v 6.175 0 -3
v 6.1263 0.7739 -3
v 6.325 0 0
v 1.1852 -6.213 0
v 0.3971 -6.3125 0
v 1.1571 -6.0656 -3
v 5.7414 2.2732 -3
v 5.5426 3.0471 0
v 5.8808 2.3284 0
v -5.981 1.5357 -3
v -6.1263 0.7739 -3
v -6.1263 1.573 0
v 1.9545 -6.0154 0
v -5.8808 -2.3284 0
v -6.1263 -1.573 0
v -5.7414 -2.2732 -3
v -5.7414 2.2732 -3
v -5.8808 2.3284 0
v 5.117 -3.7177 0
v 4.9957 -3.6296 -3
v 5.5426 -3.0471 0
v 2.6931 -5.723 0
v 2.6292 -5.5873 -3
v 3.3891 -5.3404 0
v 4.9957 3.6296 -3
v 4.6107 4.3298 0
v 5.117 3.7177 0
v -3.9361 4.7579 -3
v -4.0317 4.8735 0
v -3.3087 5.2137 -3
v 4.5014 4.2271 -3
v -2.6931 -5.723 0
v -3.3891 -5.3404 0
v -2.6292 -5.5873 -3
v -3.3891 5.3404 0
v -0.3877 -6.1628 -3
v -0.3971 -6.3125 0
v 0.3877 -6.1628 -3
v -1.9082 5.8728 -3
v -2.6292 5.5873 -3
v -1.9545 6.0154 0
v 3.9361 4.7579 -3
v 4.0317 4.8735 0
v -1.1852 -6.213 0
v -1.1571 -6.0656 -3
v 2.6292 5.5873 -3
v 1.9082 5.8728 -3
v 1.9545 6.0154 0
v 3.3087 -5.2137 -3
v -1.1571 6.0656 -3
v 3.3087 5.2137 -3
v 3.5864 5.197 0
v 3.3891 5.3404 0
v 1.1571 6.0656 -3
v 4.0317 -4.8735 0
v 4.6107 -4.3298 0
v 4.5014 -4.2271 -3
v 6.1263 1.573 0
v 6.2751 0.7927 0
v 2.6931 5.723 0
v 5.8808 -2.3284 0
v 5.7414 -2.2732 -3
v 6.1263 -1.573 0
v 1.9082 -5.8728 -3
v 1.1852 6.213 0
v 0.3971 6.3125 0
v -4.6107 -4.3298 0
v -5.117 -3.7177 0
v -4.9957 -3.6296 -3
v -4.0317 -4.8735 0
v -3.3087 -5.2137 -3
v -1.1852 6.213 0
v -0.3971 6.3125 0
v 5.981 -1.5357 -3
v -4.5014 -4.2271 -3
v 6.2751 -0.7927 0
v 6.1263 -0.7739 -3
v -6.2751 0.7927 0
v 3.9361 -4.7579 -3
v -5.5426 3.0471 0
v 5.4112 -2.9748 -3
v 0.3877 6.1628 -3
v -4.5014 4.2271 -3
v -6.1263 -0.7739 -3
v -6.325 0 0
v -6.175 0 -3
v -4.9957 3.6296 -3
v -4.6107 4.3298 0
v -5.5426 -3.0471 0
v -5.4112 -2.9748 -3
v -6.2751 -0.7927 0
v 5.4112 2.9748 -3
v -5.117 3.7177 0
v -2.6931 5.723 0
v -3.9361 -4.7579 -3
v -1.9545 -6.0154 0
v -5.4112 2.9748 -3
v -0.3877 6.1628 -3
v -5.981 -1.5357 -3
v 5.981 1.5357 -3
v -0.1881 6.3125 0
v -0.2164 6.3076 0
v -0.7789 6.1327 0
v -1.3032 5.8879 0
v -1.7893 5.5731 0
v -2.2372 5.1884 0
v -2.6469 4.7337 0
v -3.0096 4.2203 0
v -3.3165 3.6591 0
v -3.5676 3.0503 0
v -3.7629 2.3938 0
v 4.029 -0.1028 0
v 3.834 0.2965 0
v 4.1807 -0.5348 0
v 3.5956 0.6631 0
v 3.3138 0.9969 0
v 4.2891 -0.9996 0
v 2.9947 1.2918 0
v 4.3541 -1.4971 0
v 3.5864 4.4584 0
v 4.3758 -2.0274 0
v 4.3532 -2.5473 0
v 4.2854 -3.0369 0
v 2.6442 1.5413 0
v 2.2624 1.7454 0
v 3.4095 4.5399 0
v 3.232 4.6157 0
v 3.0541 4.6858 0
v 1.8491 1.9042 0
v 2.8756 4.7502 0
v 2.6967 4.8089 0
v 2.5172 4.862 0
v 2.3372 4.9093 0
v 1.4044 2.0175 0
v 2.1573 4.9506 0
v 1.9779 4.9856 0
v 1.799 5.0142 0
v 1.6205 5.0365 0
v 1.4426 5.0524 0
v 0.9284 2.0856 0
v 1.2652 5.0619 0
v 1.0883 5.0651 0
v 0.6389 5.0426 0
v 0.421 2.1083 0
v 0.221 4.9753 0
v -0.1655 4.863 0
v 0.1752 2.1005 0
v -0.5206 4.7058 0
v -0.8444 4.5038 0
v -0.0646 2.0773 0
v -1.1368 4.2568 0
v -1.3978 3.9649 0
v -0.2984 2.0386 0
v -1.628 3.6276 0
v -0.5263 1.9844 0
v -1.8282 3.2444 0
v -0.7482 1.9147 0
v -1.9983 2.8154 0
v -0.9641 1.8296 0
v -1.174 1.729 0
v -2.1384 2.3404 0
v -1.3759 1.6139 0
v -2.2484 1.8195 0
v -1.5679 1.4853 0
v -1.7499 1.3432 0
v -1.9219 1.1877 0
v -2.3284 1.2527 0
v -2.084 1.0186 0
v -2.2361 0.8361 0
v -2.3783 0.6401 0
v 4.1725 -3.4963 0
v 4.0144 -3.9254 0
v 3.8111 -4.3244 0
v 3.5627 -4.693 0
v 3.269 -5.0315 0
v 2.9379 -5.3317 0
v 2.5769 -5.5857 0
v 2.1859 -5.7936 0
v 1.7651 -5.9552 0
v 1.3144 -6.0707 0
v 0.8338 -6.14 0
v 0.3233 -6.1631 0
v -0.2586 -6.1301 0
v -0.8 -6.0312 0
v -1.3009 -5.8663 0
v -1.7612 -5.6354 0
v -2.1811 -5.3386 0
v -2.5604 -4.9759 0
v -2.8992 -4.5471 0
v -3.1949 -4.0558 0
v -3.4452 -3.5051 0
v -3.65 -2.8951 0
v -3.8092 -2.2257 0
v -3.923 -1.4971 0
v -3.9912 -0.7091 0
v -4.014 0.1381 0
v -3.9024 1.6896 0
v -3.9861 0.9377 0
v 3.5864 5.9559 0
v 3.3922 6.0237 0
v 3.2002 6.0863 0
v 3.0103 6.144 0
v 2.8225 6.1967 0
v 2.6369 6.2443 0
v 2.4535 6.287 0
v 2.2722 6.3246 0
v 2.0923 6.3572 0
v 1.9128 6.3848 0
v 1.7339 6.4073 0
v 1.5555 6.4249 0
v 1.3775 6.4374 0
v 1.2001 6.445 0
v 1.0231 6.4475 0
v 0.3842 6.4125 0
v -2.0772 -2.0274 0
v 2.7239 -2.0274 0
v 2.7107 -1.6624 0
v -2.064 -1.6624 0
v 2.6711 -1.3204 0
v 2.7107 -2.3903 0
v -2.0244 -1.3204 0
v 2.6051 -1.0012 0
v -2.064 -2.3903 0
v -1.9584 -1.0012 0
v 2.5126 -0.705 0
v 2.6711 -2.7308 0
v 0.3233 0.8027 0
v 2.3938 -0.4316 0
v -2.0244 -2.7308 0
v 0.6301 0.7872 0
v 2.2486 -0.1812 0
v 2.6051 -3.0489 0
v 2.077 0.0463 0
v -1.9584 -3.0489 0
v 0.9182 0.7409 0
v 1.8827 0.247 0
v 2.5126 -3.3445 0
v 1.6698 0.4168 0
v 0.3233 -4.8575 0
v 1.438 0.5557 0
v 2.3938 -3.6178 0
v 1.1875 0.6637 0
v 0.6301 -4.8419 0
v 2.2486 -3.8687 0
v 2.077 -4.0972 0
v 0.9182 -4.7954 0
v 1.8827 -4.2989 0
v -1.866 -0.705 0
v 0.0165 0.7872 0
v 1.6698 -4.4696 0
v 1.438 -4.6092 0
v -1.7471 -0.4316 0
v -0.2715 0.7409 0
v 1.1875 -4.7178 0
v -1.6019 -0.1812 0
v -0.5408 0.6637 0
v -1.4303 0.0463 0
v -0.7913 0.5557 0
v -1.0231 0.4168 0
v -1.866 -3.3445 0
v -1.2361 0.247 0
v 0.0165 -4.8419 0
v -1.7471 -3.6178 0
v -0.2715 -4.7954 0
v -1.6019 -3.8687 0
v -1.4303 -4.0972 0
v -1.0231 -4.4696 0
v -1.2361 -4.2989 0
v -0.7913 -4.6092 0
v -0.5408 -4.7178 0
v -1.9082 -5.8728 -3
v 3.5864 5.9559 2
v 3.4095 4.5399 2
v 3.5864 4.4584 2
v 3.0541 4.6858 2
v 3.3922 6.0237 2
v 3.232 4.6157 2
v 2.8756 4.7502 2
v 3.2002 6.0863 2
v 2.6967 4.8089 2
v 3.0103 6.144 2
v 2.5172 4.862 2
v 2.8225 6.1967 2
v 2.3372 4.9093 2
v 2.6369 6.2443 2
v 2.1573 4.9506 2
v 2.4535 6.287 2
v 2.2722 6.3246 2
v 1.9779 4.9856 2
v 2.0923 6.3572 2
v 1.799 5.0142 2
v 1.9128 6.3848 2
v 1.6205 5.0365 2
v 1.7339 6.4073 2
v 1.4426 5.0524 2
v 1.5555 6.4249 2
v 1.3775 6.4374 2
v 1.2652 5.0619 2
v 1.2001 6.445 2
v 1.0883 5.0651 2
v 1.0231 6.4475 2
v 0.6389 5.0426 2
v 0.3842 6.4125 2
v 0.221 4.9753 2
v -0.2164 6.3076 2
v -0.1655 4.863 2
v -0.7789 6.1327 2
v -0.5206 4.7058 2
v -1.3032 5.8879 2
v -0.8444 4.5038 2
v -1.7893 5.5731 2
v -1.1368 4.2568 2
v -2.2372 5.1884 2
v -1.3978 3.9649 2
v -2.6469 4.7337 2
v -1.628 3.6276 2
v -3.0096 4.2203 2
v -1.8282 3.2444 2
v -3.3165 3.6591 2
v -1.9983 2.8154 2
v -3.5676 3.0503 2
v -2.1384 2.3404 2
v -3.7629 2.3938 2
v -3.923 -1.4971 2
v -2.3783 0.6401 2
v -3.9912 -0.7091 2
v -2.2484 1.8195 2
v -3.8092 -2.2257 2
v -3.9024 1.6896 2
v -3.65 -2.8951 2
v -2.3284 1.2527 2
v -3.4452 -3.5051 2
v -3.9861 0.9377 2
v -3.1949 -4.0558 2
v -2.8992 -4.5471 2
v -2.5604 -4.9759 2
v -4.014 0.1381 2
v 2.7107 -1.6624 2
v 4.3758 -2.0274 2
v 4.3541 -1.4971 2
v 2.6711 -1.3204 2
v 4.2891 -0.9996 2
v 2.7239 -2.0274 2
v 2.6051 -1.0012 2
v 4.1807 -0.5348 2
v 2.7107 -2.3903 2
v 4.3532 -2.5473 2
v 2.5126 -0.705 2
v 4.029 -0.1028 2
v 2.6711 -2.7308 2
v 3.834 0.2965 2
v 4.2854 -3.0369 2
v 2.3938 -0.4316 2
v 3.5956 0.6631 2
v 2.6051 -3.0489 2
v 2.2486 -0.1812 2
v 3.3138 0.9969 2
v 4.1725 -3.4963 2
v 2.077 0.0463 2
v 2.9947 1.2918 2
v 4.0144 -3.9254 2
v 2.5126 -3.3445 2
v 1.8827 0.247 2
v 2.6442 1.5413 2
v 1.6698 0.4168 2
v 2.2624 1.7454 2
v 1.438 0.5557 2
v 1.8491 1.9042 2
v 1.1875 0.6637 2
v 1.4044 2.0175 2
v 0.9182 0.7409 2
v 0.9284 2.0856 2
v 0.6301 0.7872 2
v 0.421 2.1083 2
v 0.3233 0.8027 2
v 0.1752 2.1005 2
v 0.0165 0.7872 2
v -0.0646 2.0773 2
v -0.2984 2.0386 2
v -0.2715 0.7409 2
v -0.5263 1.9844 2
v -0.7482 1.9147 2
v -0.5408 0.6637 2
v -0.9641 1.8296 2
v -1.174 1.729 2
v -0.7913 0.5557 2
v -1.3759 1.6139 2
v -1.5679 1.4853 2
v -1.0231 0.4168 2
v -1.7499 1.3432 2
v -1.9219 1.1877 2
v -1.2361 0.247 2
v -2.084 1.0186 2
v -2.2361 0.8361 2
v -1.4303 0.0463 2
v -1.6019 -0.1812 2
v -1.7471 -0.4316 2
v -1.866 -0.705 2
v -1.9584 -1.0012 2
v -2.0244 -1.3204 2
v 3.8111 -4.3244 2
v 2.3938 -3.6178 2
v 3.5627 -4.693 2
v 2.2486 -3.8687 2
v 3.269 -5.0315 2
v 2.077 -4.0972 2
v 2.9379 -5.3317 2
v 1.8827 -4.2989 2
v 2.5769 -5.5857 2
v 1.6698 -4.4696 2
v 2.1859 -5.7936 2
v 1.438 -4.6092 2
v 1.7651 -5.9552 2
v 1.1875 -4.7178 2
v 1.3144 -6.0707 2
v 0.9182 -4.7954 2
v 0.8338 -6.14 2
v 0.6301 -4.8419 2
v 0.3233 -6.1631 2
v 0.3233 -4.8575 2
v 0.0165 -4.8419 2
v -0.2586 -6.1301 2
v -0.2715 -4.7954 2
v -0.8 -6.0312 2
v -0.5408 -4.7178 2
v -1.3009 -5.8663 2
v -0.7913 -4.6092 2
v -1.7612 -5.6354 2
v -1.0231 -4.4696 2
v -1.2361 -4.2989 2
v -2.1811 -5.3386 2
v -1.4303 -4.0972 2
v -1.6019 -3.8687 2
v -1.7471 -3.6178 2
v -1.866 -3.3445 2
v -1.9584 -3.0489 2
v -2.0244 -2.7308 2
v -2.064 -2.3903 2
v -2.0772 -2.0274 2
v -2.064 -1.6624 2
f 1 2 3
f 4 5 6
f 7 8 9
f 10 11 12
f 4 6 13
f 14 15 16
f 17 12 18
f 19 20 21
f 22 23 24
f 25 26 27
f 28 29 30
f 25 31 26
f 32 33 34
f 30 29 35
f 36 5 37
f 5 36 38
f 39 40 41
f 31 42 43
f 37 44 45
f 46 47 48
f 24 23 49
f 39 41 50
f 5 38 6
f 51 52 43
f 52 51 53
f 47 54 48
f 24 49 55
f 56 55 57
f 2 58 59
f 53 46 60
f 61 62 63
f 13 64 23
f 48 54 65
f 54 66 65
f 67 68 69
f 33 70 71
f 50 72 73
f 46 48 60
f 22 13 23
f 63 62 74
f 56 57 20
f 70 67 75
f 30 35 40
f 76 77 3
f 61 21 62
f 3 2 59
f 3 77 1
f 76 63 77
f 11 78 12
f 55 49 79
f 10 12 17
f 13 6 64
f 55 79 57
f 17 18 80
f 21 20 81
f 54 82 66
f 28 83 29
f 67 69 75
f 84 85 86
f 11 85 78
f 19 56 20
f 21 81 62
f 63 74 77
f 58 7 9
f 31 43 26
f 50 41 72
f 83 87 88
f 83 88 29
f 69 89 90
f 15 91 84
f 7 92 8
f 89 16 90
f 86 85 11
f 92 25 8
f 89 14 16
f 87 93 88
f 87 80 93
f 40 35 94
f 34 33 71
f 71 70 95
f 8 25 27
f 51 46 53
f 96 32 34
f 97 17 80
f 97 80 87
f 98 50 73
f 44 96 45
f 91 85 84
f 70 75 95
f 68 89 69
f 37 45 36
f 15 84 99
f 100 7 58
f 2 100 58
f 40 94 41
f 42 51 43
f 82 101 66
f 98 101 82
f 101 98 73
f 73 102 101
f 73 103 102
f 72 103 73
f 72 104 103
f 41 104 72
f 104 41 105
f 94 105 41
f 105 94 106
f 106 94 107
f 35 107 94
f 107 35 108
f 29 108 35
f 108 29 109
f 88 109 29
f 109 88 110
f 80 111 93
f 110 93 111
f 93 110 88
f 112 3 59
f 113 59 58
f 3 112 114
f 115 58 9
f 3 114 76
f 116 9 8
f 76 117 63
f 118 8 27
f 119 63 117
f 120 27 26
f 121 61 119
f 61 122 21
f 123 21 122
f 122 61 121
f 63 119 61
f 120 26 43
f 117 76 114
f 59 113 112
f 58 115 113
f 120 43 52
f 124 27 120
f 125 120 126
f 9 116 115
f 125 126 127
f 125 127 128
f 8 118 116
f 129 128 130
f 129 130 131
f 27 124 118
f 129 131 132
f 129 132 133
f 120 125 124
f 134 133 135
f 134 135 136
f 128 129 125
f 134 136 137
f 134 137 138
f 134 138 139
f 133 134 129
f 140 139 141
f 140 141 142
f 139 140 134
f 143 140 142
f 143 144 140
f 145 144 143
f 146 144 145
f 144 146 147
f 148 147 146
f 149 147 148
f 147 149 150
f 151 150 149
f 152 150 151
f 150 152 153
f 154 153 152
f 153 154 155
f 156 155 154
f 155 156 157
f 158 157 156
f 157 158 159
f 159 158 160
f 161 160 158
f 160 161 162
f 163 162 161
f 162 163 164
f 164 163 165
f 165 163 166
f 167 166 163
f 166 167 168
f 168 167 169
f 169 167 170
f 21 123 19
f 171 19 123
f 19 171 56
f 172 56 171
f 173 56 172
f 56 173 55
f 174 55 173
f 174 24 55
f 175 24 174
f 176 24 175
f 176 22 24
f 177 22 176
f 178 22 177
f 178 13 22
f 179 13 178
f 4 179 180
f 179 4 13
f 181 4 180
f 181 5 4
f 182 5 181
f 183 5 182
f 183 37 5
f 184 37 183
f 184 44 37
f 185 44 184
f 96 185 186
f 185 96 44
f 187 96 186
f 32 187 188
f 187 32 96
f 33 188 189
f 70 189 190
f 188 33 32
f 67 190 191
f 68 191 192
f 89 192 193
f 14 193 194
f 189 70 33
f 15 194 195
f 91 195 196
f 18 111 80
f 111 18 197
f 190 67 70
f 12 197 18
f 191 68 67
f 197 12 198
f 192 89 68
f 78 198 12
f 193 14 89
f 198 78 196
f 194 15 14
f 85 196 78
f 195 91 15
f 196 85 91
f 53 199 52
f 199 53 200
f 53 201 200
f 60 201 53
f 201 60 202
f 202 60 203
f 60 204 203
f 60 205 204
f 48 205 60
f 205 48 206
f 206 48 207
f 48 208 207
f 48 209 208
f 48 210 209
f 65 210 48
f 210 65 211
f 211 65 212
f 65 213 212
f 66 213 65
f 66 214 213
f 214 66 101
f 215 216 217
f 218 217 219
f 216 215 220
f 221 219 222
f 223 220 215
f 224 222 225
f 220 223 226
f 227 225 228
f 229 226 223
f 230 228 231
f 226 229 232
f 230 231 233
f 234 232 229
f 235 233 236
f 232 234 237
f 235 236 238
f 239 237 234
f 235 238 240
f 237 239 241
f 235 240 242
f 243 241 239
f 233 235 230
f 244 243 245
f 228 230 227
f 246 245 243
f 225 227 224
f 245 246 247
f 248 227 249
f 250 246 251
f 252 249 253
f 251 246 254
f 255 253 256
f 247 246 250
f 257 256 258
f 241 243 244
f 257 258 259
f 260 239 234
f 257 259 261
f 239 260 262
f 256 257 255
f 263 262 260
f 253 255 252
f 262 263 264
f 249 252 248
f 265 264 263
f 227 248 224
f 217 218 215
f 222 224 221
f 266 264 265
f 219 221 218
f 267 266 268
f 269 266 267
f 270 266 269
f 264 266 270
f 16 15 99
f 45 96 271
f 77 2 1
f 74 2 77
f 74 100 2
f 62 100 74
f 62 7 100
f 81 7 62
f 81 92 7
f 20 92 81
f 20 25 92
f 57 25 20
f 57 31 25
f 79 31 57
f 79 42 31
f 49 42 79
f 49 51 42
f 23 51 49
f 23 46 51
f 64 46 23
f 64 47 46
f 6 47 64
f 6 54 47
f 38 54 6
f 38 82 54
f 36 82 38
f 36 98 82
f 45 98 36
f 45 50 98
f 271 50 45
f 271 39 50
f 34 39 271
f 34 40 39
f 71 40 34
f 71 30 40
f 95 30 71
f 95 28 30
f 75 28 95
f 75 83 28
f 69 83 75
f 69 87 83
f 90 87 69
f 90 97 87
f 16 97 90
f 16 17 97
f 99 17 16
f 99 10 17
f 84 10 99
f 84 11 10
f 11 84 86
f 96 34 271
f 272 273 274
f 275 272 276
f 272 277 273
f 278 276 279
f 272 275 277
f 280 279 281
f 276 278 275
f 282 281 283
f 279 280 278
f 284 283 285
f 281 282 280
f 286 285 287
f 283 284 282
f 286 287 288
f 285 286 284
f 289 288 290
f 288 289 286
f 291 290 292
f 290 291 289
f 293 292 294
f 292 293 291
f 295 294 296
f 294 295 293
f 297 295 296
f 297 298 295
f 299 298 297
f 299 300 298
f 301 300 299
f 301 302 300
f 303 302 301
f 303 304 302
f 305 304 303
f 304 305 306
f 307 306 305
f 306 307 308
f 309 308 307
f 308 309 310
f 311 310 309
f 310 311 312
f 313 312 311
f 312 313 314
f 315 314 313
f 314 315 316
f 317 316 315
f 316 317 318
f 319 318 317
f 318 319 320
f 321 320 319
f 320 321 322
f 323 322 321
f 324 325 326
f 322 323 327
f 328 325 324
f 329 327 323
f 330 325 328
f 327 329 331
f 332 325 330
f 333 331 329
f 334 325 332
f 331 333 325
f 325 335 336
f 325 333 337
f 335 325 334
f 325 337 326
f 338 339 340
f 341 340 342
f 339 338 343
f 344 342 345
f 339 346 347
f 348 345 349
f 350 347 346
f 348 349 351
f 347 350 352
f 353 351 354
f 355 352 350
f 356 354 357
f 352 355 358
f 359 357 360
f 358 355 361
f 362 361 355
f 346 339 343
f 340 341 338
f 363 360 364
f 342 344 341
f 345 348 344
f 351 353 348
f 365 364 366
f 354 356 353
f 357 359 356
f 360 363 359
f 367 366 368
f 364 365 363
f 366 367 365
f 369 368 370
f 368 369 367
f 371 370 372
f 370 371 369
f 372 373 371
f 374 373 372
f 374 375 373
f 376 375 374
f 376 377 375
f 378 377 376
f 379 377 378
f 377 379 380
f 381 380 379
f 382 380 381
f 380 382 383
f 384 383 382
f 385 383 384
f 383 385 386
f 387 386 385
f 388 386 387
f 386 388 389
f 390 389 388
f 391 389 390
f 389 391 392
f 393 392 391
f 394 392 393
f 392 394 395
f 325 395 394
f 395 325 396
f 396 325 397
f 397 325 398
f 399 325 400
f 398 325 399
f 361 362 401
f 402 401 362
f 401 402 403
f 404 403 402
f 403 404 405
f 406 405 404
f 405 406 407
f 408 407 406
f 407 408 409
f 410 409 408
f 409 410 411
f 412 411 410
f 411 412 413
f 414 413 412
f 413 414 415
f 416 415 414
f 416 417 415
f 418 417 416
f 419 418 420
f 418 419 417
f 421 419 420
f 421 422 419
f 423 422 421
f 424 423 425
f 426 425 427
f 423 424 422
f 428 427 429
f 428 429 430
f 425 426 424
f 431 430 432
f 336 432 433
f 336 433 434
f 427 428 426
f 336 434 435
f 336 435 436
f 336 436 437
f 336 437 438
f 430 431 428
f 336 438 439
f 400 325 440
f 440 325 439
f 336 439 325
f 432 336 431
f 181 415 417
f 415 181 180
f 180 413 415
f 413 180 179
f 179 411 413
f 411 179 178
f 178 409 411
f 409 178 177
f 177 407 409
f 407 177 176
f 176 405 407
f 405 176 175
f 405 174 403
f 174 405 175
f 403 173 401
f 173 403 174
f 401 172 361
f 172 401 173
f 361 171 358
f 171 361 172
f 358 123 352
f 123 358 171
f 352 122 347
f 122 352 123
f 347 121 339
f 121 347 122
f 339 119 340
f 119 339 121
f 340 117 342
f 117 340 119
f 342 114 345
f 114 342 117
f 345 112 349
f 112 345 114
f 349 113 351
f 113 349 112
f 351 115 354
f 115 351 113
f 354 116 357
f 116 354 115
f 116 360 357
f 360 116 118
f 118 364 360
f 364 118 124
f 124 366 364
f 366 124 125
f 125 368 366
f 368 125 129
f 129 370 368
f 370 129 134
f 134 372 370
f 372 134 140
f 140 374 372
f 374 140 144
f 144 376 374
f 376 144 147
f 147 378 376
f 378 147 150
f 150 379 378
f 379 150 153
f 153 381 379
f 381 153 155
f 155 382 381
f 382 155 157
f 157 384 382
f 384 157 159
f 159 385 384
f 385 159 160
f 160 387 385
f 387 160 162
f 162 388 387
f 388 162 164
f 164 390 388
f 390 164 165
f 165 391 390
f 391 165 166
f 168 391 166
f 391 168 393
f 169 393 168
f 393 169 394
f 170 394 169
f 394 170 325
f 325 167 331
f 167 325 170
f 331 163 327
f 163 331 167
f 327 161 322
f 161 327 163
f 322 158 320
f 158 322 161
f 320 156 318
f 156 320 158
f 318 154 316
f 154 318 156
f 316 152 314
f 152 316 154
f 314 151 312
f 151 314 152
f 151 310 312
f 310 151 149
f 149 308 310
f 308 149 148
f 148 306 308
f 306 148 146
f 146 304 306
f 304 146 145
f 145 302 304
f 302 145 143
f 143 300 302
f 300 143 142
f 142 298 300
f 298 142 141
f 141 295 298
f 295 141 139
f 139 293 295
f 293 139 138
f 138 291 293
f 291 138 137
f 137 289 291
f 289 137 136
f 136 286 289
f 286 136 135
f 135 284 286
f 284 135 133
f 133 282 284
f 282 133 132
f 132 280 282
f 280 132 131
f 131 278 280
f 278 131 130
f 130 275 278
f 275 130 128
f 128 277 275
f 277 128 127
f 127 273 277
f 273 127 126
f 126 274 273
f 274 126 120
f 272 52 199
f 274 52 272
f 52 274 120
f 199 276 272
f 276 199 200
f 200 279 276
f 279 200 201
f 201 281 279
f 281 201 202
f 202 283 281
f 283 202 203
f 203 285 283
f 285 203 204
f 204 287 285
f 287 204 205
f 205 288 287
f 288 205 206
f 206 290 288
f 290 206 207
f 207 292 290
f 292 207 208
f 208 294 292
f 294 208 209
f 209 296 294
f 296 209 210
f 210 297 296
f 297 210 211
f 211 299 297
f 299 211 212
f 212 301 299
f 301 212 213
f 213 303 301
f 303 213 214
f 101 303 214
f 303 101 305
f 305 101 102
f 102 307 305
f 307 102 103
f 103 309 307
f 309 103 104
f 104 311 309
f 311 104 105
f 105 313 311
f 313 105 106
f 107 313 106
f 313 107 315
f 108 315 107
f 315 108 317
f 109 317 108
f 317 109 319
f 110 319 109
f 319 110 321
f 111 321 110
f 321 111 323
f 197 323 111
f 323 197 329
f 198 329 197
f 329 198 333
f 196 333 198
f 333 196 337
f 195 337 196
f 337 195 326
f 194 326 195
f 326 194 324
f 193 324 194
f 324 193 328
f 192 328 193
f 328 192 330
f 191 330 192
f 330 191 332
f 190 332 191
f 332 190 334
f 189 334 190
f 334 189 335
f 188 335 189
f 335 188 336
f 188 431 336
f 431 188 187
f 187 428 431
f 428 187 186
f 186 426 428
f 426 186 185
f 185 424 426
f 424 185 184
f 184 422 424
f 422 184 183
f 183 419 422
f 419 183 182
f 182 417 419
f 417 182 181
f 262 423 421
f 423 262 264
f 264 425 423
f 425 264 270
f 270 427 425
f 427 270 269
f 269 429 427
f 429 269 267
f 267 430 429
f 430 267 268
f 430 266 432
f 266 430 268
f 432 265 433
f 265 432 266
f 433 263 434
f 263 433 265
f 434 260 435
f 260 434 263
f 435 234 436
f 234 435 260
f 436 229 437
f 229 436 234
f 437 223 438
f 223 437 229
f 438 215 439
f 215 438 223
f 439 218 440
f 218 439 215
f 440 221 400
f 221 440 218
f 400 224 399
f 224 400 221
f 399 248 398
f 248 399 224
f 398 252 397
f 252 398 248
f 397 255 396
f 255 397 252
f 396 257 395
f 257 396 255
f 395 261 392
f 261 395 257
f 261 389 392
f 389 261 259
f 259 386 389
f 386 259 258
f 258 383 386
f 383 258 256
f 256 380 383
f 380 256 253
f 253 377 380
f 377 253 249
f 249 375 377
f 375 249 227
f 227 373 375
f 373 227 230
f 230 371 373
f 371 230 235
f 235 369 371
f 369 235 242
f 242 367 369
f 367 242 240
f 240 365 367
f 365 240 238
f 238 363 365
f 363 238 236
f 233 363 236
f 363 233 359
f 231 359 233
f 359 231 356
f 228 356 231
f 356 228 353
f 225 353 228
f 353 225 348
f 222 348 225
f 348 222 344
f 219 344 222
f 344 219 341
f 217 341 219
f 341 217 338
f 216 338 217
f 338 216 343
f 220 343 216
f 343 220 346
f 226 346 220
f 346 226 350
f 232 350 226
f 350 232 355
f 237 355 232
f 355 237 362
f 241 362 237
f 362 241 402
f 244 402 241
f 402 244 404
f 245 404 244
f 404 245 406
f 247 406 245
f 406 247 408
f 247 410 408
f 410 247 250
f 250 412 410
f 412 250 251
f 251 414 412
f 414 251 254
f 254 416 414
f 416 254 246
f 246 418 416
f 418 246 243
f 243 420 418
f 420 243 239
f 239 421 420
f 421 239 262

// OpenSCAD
$fn = 50;

difference() {
	union() {
		translate(v = [0, 0, -3.0]) {
			cylinder(h = 3, r1 = 6.175, r2 = 6.325);
		}
		linear_extrude(height = 2) {
			text(font = "Impact", halign = "center", size = 12, text = "6", valign = "center");
		}
	}
	union();
}
